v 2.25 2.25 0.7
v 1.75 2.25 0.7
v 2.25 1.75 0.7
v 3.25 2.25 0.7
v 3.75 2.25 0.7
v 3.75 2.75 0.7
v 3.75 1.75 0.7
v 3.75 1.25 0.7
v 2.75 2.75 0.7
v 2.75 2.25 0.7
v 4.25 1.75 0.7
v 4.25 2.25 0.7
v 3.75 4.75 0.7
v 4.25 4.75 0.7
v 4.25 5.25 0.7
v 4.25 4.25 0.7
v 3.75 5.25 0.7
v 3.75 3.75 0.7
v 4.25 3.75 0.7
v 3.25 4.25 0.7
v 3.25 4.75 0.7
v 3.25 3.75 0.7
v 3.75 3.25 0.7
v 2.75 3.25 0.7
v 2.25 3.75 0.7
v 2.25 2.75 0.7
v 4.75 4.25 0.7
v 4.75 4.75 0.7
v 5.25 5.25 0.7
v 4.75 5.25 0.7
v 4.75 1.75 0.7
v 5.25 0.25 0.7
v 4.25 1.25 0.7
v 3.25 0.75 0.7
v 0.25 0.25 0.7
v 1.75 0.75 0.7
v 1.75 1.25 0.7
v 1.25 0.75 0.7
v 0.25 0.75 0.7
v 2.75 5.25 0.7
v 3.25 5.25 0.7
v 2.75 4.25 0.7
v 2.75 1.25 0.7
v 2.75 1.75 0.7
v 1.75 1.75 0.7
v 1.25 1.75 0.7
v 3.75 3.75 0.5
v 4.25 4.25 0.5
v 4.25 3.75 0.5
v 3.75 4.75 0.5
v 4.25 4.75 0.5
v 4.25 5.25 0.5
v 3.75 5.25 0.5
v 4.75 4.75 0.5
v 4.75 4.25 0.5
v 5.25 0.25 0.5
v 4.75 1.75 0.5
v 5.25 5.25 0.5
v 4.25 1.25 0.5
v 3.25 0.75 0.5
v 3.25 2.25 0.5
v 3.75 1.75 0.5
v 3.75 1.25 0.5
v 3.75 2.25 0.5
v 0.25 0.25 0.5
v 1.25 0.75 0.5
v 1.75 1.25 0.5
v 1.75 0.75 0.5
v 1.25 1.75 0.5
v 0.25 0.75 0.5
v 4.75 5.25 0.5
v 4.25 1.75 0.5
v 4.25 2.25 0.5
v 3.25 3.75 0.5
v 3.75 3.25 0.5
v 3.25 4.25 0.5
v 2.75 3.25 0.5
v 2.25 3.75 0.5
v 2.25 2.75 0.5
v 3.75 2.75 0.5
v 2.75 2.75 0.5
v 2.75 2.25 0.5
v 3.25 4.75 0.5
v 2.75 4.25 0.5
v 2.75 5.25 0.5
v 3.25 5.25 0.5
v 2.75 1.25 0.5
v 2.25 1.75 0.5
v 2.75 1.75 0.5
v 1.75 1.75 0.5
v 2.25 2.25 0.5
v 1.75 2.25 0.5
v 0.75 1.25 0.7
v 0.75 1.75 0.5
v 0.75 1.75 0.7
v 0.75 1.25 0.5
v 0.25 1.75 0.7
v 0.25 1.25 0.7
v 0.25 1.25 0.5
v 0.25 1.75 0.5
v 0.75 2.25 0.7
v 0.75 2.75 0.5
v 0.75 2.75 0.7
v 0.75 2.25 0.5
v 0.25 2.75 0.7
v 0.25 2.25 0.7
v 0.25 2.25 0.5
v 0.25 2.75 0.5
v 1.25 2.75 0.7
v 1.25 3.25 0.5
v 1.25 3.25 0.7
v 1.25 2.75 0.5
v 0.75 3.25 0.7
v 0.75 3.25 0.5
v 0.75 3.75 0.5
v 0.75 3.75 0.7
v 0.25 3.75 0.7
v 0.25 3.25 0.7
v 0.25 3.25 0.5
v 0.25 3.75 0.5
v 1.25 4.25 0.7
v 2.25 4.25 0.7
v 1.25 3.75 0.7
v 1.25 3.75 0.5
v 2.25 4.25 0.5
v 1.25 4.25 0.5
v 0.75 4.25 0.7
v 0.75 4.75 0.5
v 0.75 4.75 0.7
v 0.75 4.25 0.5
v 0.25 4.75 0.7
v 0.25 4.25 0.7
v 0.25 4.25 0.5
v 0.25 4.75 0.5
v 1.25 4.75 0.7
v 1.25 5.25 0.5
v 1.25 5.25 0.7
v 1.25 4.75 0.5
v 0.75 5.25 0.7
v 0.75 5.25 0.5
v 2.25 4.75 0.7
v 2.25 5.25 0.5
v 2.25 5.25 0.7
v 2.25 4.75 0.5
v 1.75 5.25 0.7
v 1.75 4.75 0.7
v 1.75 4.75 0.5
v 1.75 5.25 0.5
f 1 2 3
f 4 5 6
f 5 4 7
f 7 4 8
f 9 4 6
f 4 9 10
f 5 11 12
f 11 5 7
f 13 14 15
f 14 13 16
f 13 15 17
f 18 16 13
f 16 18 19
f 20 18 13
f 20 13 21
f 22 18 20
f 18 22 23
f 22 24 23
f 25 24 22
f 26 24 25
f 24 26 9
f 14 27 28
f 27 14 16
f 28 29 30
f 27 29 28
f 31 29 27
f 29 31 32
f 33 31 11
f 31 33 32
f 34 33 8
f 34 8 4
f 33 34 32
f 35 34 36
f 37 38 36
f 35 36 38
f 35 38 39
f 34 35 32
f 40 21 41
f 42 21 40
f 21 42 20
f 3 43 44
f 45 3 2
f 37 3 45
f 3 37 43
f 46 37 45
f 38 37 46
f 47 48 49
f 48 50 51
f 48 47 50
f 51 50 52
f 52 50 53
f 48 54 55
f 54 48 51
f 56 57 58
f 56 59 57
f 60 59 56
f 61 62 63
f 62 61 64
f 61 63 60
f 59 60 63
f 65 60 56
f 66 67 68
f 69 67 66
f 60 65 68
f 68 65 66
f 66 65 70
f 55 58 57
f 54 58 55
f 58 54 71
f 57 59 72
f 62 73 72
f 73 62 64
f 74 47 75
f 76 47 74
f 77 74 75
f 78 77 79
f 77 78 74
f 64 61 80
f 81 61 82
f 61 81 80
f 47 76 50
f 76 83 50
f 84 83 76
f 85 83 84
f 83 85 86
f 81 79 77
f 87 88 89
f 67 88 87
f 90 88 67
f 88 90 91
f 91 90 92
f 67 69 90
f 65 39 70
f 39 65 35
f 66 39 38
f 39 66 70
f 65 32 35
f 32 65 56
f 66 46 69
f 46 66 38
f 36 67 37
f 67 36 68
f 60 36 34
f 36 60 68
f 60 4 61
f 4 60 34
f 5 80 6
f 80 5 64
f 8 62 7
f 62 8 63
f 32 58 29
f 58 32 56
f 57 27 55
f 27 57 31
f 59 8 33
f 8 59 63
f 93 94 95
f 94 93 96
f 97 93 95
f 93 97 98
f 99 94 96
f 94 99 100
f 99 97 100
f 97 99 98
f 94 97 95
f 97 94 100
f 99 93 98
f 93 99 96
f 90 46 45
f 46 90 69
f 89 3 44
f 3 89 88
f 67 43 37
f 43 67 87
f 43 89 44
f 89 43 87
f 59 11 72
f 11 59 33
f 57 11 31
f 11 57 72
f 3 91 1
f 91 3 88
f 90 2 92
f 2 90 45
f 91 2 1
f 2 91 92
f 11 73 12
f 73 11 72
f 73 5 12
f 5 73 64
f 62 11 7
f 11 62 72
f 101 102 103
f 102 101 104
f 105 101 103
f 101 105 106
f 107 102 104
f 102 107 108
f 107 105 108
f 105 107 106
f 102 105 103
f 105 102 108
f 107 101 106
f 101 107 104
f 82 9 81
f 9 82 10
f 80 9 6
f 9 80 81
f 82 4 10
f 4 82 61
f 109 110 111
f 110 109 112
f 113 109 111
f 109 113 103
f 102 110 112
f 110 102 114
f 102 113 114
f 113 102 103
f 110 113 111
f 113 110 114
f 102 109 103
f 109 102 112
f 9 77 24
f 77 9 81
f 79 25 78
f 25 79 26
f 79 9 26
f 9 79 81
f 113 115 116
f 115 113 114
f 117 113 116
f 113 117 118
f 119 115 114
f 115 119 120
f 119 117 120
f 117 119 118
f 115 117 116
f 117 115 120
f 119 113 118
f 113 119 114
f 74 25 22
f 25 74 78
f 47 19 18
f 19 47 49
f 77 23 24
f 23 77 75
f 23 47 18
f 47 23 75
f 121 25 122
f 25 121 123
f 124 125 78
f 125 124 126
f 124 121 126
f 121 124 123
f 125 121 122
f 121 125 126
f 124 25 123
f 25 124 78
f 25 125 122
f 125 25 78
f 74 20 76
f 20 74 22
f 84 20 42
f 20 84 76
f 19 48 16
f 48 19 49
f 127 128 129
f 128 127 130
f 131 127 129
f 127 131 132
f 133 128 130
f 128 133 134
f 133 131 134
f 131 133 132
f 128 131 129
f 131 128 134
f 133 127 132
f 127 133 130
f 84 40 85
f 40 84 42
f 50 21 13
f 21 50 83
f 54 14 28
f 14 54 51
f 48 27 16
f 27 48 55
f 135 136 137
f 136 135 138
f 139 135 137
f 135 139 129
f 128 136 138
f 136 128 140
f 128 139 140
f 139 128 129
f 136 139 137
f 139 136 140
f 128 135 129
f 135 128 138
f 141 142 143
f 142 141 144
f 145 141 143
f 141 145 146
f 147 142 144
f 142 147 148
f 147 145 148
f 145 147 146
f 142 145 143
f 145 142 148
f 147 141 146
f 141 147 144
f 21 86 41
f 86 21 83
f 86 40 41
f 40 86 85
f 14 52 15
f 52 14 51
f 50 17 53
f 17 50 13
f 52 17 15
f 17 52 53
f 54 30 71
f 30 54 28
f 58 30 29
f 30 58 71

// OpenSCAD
rotate([0,0,0])translate([0,0,0.6]){
translate([0.5,0.5,0])  cube(size = [0.5,0.5,0.2], center=true);
translate([1,0.5,0])  cube(size = [0.5,0.5,0.2], center=true);
translate([1.5,0.5,0])  cube(size = [0.5,0.5,0.2], center=true);
translate([2,0.5,0])  cube(size = [0.5,0.5,0.2], center=true);
translate([2.5,0.5,0])  cube(size = [0.5,0.5,0.2], center=true);
translate([3,0.5,0])  cube(size = [0.5,0.5,0.2], center=true);
translate([3.5,0.5,0])  cube(size = [0.5,0.5,0.2], center=true);
translate([4,0.5,0])  cube(size = [0.5,0.5,0.2], center=true);
translate([4.5,0.5,0])  cube(size = [0.5,0.5,0.2], center=true);
translate([5,0.5,0])  cube(size = [0.5,0.5,0.2], center=true);
translate([5,0.5,0])  cube(size = [0.5,0.5,0.2], center=true);
translate([5,0.5,0])  cube(size = [0.5,0.5,0.2], center=true);
translate([1.5,1,0])  cube(size = [0.5,0.5,0.2], center=true);
translate([1.5,1,0])  cube(size = [0.5,0.5,0.2], center=true);
translate([1.5,1,0])  cube(size = [0.5,0.5,0.2], center=true);
translate([1.5,1,0])  cube(size = [0.5,0.5,0.2], center=true);
translate([3.5,1,0])  cube(size = [0.5,0.5,0.2], center=true);
translate([4,1,0])  cube(size = [0.5,0.5,0.2], center=true);
translate([4.5,1,0])  cube(size = [0.5,0.5,0.2], center=true);
translate([5,1,0])  cube(size = [0.5,0.5,0.2], center=true);
translate([0.5,1.5,0])  cube(size = [0.5,0.5,0.2], center=true);
translate([0.5,1.5,0])  cube(size = [0.5,0.5,0.2], center=true);
translate([1.5,1.5,0])  cube(size = [0.5,0.5,0.2], center=true);
translate([2,1.5,0])  cube(size = [0.5,0.5,0.2], center=true);
translate([2.5,1.5,0])  cube(size = [0.5,0.5,0.2], center=true);
translate([2.5,1.5,0])  cube(size = [0.5,0.5,0.2], center=true);
translate([3.5,1.5,0])  cube(size = [0.5,0.5,0.2], center=true);
translate([3.5,1.5,0])  cube(size = [0.5,0.5,0.2], center=true);
translate([4.5,1.5,0])  cube(size = [0.5,0.5,0.2], center=true);
translate([5,1.5,0])  cube(size = [0.5,0.5,0.2], center=true);
translate([5,1.5,0])  cube(size = [0.5,0.5,0.2], center=true);
translate([5,1.5,0])  cube(size = [0.5,0.5,0.2], center=true);
translate([5,1.5,0])  cube(size = [0.5,0.5,0.2], center=true);
translate([2,2,0])  cube(size = [0.5,0.5,0.2], center=true);
translate([2,2,0])  cube(size = [0.5,0.5,0.2], center=true);
translate([2,2,0])  cube(size = [0.5,0.5,0.2], center=true);
translate([3.5,2,0])  cube(size = [0.5,0.5,0.2], center=true);
translate([4,2,0])  cube(size = [0.5,0.5,0.2], center=true);
translate([4,2,0])  cube(size = [0.5,0.5,0.2], center=true);
translate([5,2,0])  cube(size = [0.5,0.5,0.2], center=true);
translate([0.5,2.5,0])  cube(size = [0.5,0.5,0.2], center=true);
translate([0.5,2.5,0])  cube(size = [0.5,0.5,0.2], center=true);
translate([0.5,2.5,0])  cube(size = [0.5,0.5,0.2], center=true);
translate([0.5,2.5,0])  cube(size = [0.5,0.5,0.2], center=true);
translate([0.5,2.5,0])  cube(size = [0.5,0.5,0.2], center=true);
translate([3,2.5,0])  cube(size = [0.5,0.5,0.2], center=true);
translate([3.5,2.5,0])  cube(size = [0.5,0.5,0.2], center=true);
translate([3.5,2.5,0])  cube(size = [0.5,0.5,0.2], center=true);
translate([3.5,2.5,0])  cube(size = [0.5,0.5,0.2], center=true);
translate([5,2.5,0])  cube(size = [0.5,0.5,0.2], center=true);
translate([5,2.5,0])  cube(size = [0.5,0.5,0.2], center=true);
translate([1,3,0])  cube(size = [0.5,0.5,0.2], center=true);
translate([1,3,0])  cube(size = [0.5,0.5,0.2], center=true);
translate([1,3,0])  cube(size = [0.5,0.5,0.2], center=true);
translate([2.5,3,0])  cube(size = [0.5,0.5,0.2], center=true);
translate([2.5,3,0])  cube(size = [0.5,0.5,0.2], center=true);
translate([2.5,3,0])  cube(size = [0.5,0.5,0.2], center=true);
translate([2.5,3,0])  cube(size = [0.5,0.5,0.2], center=true);
translate([2.5,3,0])  cube(size = [0.5,0.5,0.2], center=true);
translate([5,3,0])  cube(size = [0.5,0.5,0.2], center=true);
translate([0.5,3.5,0])  cube(size = [0.5,0.5,0.2], center=true);
translate([0.5,3.5,0])  cube(size = [0.5,0.5,0.2], center=true);
translate([0.5,3.5,0])  cube(size = [0.5,0.5,0.2], center=true);
translate([0.5,3.5,0])  cube(size = [0.5,0.5,0.2], center=true);
translate([2.5,3.5,0])  cube(size = [0.5,0.5,0.2], center=true);
translate([3,3.5,0])  cube(size = [0.5,0.5,0.2], center=true);
translate([3.5,3.5,0])  cube(size = [0.5,0.5,0.2], center=true);
translate([3.5,3.5,0])  cube(size = [0.5,0.5,0.2], center=true);
translate([3.5,3.5,0])  cube(size = [0.5,0.5,0.2], center=true);
translate([5,3.5,0])  cube(size = [0.5,0.5,0.2], center=true);
translate([5,3.5,0])  cube(size = [0.5,0.5,0.2], center=true);
translate([5,3.5,0])  cube(size = [0.5,0.5,0.2], center=true);
translate([1.5,4,0])  cube(size = [0.5,0.5,0.2], center=true);
translate([2,4,0])  cube(size = [0.5,0.5,0.2], center=true);
translate([2,4,0])  cube(size = [0.5,0.5,0.2], center=true);
translate([2,4,0])  cube(size = [0.5,0.5,0.2], center=true);
translate([3.5,4,0])  cube(size = [0.5,0.5,0.2], center=true);
translate([4,4,0])  cube(size = [0.5,0.5,0.2], center=true);
translate([4,4,0])  cube(size = [0.5,0.5,0.2], center=true);
translate([5,4,0])  cube(size = [0.5,0.5,0.2], center=true);
translate([0.5,4.5,0])  cube(size = [0.5,0.5,0.2], center=true);
translate([0.5,4.5,0])  cube(size = [0.5,0.5,0.2], center=true);
translate([0.5,4.5,0])  cube(size = [0.5,0.5,0.2], center=true);
translate([0.5,4.5,0])  cube(size = [0.5,0.5,0.2], center=true);
translate([0.5,4.5,0])  cube(size = [0.5,0.5,0.2], center=true);
translate([3,4.5,0])  cube(size = [0.5,0.5,0.2], center=true);
translate([3.5,4.5,0])  cube(size = [0.5,0.5,0.2], center=true);
translate([4,4.5,0])  cube(size = [0.5,0.5,0.2], center=true);
translate([4.5,4.5,0])  cube(size = [0.5,0.5,0.2], center=true);
translate([5,4.5,0])  cube(size = [0.5,0.5,0.2], center=true);
translate([5,4.5,0])  cube(size = [0.5,0.5,0.2], center=true);
translate([1,5,0])  cube(size = [0.5,0.5,0.2], center=true);
translate([1,5,0])  cube(size = [0.5,0.5,0.2], center=true);
translate([2,5,0])  cube(size = [0.5,0.5,0.2], center=true);
translate([2,5,0])  cube(size = [0.5,0.5,0.2], center=true);
translate([3,5,0])  cube(size = [0.5,0.5,0.2], center=true);
translate([3,5,0])  cube(size = [0.5,0.5,0.2], center=true);
translate([4,5,0])  cube(size = [0.5,0.5,0.2], center=true);
translate([4,5,0])  cube(size = [0.5,0.5,0.2], center=true);
translate([5,5,0])  cube(size = [0.5,0.5,0.2], center=true);
}
